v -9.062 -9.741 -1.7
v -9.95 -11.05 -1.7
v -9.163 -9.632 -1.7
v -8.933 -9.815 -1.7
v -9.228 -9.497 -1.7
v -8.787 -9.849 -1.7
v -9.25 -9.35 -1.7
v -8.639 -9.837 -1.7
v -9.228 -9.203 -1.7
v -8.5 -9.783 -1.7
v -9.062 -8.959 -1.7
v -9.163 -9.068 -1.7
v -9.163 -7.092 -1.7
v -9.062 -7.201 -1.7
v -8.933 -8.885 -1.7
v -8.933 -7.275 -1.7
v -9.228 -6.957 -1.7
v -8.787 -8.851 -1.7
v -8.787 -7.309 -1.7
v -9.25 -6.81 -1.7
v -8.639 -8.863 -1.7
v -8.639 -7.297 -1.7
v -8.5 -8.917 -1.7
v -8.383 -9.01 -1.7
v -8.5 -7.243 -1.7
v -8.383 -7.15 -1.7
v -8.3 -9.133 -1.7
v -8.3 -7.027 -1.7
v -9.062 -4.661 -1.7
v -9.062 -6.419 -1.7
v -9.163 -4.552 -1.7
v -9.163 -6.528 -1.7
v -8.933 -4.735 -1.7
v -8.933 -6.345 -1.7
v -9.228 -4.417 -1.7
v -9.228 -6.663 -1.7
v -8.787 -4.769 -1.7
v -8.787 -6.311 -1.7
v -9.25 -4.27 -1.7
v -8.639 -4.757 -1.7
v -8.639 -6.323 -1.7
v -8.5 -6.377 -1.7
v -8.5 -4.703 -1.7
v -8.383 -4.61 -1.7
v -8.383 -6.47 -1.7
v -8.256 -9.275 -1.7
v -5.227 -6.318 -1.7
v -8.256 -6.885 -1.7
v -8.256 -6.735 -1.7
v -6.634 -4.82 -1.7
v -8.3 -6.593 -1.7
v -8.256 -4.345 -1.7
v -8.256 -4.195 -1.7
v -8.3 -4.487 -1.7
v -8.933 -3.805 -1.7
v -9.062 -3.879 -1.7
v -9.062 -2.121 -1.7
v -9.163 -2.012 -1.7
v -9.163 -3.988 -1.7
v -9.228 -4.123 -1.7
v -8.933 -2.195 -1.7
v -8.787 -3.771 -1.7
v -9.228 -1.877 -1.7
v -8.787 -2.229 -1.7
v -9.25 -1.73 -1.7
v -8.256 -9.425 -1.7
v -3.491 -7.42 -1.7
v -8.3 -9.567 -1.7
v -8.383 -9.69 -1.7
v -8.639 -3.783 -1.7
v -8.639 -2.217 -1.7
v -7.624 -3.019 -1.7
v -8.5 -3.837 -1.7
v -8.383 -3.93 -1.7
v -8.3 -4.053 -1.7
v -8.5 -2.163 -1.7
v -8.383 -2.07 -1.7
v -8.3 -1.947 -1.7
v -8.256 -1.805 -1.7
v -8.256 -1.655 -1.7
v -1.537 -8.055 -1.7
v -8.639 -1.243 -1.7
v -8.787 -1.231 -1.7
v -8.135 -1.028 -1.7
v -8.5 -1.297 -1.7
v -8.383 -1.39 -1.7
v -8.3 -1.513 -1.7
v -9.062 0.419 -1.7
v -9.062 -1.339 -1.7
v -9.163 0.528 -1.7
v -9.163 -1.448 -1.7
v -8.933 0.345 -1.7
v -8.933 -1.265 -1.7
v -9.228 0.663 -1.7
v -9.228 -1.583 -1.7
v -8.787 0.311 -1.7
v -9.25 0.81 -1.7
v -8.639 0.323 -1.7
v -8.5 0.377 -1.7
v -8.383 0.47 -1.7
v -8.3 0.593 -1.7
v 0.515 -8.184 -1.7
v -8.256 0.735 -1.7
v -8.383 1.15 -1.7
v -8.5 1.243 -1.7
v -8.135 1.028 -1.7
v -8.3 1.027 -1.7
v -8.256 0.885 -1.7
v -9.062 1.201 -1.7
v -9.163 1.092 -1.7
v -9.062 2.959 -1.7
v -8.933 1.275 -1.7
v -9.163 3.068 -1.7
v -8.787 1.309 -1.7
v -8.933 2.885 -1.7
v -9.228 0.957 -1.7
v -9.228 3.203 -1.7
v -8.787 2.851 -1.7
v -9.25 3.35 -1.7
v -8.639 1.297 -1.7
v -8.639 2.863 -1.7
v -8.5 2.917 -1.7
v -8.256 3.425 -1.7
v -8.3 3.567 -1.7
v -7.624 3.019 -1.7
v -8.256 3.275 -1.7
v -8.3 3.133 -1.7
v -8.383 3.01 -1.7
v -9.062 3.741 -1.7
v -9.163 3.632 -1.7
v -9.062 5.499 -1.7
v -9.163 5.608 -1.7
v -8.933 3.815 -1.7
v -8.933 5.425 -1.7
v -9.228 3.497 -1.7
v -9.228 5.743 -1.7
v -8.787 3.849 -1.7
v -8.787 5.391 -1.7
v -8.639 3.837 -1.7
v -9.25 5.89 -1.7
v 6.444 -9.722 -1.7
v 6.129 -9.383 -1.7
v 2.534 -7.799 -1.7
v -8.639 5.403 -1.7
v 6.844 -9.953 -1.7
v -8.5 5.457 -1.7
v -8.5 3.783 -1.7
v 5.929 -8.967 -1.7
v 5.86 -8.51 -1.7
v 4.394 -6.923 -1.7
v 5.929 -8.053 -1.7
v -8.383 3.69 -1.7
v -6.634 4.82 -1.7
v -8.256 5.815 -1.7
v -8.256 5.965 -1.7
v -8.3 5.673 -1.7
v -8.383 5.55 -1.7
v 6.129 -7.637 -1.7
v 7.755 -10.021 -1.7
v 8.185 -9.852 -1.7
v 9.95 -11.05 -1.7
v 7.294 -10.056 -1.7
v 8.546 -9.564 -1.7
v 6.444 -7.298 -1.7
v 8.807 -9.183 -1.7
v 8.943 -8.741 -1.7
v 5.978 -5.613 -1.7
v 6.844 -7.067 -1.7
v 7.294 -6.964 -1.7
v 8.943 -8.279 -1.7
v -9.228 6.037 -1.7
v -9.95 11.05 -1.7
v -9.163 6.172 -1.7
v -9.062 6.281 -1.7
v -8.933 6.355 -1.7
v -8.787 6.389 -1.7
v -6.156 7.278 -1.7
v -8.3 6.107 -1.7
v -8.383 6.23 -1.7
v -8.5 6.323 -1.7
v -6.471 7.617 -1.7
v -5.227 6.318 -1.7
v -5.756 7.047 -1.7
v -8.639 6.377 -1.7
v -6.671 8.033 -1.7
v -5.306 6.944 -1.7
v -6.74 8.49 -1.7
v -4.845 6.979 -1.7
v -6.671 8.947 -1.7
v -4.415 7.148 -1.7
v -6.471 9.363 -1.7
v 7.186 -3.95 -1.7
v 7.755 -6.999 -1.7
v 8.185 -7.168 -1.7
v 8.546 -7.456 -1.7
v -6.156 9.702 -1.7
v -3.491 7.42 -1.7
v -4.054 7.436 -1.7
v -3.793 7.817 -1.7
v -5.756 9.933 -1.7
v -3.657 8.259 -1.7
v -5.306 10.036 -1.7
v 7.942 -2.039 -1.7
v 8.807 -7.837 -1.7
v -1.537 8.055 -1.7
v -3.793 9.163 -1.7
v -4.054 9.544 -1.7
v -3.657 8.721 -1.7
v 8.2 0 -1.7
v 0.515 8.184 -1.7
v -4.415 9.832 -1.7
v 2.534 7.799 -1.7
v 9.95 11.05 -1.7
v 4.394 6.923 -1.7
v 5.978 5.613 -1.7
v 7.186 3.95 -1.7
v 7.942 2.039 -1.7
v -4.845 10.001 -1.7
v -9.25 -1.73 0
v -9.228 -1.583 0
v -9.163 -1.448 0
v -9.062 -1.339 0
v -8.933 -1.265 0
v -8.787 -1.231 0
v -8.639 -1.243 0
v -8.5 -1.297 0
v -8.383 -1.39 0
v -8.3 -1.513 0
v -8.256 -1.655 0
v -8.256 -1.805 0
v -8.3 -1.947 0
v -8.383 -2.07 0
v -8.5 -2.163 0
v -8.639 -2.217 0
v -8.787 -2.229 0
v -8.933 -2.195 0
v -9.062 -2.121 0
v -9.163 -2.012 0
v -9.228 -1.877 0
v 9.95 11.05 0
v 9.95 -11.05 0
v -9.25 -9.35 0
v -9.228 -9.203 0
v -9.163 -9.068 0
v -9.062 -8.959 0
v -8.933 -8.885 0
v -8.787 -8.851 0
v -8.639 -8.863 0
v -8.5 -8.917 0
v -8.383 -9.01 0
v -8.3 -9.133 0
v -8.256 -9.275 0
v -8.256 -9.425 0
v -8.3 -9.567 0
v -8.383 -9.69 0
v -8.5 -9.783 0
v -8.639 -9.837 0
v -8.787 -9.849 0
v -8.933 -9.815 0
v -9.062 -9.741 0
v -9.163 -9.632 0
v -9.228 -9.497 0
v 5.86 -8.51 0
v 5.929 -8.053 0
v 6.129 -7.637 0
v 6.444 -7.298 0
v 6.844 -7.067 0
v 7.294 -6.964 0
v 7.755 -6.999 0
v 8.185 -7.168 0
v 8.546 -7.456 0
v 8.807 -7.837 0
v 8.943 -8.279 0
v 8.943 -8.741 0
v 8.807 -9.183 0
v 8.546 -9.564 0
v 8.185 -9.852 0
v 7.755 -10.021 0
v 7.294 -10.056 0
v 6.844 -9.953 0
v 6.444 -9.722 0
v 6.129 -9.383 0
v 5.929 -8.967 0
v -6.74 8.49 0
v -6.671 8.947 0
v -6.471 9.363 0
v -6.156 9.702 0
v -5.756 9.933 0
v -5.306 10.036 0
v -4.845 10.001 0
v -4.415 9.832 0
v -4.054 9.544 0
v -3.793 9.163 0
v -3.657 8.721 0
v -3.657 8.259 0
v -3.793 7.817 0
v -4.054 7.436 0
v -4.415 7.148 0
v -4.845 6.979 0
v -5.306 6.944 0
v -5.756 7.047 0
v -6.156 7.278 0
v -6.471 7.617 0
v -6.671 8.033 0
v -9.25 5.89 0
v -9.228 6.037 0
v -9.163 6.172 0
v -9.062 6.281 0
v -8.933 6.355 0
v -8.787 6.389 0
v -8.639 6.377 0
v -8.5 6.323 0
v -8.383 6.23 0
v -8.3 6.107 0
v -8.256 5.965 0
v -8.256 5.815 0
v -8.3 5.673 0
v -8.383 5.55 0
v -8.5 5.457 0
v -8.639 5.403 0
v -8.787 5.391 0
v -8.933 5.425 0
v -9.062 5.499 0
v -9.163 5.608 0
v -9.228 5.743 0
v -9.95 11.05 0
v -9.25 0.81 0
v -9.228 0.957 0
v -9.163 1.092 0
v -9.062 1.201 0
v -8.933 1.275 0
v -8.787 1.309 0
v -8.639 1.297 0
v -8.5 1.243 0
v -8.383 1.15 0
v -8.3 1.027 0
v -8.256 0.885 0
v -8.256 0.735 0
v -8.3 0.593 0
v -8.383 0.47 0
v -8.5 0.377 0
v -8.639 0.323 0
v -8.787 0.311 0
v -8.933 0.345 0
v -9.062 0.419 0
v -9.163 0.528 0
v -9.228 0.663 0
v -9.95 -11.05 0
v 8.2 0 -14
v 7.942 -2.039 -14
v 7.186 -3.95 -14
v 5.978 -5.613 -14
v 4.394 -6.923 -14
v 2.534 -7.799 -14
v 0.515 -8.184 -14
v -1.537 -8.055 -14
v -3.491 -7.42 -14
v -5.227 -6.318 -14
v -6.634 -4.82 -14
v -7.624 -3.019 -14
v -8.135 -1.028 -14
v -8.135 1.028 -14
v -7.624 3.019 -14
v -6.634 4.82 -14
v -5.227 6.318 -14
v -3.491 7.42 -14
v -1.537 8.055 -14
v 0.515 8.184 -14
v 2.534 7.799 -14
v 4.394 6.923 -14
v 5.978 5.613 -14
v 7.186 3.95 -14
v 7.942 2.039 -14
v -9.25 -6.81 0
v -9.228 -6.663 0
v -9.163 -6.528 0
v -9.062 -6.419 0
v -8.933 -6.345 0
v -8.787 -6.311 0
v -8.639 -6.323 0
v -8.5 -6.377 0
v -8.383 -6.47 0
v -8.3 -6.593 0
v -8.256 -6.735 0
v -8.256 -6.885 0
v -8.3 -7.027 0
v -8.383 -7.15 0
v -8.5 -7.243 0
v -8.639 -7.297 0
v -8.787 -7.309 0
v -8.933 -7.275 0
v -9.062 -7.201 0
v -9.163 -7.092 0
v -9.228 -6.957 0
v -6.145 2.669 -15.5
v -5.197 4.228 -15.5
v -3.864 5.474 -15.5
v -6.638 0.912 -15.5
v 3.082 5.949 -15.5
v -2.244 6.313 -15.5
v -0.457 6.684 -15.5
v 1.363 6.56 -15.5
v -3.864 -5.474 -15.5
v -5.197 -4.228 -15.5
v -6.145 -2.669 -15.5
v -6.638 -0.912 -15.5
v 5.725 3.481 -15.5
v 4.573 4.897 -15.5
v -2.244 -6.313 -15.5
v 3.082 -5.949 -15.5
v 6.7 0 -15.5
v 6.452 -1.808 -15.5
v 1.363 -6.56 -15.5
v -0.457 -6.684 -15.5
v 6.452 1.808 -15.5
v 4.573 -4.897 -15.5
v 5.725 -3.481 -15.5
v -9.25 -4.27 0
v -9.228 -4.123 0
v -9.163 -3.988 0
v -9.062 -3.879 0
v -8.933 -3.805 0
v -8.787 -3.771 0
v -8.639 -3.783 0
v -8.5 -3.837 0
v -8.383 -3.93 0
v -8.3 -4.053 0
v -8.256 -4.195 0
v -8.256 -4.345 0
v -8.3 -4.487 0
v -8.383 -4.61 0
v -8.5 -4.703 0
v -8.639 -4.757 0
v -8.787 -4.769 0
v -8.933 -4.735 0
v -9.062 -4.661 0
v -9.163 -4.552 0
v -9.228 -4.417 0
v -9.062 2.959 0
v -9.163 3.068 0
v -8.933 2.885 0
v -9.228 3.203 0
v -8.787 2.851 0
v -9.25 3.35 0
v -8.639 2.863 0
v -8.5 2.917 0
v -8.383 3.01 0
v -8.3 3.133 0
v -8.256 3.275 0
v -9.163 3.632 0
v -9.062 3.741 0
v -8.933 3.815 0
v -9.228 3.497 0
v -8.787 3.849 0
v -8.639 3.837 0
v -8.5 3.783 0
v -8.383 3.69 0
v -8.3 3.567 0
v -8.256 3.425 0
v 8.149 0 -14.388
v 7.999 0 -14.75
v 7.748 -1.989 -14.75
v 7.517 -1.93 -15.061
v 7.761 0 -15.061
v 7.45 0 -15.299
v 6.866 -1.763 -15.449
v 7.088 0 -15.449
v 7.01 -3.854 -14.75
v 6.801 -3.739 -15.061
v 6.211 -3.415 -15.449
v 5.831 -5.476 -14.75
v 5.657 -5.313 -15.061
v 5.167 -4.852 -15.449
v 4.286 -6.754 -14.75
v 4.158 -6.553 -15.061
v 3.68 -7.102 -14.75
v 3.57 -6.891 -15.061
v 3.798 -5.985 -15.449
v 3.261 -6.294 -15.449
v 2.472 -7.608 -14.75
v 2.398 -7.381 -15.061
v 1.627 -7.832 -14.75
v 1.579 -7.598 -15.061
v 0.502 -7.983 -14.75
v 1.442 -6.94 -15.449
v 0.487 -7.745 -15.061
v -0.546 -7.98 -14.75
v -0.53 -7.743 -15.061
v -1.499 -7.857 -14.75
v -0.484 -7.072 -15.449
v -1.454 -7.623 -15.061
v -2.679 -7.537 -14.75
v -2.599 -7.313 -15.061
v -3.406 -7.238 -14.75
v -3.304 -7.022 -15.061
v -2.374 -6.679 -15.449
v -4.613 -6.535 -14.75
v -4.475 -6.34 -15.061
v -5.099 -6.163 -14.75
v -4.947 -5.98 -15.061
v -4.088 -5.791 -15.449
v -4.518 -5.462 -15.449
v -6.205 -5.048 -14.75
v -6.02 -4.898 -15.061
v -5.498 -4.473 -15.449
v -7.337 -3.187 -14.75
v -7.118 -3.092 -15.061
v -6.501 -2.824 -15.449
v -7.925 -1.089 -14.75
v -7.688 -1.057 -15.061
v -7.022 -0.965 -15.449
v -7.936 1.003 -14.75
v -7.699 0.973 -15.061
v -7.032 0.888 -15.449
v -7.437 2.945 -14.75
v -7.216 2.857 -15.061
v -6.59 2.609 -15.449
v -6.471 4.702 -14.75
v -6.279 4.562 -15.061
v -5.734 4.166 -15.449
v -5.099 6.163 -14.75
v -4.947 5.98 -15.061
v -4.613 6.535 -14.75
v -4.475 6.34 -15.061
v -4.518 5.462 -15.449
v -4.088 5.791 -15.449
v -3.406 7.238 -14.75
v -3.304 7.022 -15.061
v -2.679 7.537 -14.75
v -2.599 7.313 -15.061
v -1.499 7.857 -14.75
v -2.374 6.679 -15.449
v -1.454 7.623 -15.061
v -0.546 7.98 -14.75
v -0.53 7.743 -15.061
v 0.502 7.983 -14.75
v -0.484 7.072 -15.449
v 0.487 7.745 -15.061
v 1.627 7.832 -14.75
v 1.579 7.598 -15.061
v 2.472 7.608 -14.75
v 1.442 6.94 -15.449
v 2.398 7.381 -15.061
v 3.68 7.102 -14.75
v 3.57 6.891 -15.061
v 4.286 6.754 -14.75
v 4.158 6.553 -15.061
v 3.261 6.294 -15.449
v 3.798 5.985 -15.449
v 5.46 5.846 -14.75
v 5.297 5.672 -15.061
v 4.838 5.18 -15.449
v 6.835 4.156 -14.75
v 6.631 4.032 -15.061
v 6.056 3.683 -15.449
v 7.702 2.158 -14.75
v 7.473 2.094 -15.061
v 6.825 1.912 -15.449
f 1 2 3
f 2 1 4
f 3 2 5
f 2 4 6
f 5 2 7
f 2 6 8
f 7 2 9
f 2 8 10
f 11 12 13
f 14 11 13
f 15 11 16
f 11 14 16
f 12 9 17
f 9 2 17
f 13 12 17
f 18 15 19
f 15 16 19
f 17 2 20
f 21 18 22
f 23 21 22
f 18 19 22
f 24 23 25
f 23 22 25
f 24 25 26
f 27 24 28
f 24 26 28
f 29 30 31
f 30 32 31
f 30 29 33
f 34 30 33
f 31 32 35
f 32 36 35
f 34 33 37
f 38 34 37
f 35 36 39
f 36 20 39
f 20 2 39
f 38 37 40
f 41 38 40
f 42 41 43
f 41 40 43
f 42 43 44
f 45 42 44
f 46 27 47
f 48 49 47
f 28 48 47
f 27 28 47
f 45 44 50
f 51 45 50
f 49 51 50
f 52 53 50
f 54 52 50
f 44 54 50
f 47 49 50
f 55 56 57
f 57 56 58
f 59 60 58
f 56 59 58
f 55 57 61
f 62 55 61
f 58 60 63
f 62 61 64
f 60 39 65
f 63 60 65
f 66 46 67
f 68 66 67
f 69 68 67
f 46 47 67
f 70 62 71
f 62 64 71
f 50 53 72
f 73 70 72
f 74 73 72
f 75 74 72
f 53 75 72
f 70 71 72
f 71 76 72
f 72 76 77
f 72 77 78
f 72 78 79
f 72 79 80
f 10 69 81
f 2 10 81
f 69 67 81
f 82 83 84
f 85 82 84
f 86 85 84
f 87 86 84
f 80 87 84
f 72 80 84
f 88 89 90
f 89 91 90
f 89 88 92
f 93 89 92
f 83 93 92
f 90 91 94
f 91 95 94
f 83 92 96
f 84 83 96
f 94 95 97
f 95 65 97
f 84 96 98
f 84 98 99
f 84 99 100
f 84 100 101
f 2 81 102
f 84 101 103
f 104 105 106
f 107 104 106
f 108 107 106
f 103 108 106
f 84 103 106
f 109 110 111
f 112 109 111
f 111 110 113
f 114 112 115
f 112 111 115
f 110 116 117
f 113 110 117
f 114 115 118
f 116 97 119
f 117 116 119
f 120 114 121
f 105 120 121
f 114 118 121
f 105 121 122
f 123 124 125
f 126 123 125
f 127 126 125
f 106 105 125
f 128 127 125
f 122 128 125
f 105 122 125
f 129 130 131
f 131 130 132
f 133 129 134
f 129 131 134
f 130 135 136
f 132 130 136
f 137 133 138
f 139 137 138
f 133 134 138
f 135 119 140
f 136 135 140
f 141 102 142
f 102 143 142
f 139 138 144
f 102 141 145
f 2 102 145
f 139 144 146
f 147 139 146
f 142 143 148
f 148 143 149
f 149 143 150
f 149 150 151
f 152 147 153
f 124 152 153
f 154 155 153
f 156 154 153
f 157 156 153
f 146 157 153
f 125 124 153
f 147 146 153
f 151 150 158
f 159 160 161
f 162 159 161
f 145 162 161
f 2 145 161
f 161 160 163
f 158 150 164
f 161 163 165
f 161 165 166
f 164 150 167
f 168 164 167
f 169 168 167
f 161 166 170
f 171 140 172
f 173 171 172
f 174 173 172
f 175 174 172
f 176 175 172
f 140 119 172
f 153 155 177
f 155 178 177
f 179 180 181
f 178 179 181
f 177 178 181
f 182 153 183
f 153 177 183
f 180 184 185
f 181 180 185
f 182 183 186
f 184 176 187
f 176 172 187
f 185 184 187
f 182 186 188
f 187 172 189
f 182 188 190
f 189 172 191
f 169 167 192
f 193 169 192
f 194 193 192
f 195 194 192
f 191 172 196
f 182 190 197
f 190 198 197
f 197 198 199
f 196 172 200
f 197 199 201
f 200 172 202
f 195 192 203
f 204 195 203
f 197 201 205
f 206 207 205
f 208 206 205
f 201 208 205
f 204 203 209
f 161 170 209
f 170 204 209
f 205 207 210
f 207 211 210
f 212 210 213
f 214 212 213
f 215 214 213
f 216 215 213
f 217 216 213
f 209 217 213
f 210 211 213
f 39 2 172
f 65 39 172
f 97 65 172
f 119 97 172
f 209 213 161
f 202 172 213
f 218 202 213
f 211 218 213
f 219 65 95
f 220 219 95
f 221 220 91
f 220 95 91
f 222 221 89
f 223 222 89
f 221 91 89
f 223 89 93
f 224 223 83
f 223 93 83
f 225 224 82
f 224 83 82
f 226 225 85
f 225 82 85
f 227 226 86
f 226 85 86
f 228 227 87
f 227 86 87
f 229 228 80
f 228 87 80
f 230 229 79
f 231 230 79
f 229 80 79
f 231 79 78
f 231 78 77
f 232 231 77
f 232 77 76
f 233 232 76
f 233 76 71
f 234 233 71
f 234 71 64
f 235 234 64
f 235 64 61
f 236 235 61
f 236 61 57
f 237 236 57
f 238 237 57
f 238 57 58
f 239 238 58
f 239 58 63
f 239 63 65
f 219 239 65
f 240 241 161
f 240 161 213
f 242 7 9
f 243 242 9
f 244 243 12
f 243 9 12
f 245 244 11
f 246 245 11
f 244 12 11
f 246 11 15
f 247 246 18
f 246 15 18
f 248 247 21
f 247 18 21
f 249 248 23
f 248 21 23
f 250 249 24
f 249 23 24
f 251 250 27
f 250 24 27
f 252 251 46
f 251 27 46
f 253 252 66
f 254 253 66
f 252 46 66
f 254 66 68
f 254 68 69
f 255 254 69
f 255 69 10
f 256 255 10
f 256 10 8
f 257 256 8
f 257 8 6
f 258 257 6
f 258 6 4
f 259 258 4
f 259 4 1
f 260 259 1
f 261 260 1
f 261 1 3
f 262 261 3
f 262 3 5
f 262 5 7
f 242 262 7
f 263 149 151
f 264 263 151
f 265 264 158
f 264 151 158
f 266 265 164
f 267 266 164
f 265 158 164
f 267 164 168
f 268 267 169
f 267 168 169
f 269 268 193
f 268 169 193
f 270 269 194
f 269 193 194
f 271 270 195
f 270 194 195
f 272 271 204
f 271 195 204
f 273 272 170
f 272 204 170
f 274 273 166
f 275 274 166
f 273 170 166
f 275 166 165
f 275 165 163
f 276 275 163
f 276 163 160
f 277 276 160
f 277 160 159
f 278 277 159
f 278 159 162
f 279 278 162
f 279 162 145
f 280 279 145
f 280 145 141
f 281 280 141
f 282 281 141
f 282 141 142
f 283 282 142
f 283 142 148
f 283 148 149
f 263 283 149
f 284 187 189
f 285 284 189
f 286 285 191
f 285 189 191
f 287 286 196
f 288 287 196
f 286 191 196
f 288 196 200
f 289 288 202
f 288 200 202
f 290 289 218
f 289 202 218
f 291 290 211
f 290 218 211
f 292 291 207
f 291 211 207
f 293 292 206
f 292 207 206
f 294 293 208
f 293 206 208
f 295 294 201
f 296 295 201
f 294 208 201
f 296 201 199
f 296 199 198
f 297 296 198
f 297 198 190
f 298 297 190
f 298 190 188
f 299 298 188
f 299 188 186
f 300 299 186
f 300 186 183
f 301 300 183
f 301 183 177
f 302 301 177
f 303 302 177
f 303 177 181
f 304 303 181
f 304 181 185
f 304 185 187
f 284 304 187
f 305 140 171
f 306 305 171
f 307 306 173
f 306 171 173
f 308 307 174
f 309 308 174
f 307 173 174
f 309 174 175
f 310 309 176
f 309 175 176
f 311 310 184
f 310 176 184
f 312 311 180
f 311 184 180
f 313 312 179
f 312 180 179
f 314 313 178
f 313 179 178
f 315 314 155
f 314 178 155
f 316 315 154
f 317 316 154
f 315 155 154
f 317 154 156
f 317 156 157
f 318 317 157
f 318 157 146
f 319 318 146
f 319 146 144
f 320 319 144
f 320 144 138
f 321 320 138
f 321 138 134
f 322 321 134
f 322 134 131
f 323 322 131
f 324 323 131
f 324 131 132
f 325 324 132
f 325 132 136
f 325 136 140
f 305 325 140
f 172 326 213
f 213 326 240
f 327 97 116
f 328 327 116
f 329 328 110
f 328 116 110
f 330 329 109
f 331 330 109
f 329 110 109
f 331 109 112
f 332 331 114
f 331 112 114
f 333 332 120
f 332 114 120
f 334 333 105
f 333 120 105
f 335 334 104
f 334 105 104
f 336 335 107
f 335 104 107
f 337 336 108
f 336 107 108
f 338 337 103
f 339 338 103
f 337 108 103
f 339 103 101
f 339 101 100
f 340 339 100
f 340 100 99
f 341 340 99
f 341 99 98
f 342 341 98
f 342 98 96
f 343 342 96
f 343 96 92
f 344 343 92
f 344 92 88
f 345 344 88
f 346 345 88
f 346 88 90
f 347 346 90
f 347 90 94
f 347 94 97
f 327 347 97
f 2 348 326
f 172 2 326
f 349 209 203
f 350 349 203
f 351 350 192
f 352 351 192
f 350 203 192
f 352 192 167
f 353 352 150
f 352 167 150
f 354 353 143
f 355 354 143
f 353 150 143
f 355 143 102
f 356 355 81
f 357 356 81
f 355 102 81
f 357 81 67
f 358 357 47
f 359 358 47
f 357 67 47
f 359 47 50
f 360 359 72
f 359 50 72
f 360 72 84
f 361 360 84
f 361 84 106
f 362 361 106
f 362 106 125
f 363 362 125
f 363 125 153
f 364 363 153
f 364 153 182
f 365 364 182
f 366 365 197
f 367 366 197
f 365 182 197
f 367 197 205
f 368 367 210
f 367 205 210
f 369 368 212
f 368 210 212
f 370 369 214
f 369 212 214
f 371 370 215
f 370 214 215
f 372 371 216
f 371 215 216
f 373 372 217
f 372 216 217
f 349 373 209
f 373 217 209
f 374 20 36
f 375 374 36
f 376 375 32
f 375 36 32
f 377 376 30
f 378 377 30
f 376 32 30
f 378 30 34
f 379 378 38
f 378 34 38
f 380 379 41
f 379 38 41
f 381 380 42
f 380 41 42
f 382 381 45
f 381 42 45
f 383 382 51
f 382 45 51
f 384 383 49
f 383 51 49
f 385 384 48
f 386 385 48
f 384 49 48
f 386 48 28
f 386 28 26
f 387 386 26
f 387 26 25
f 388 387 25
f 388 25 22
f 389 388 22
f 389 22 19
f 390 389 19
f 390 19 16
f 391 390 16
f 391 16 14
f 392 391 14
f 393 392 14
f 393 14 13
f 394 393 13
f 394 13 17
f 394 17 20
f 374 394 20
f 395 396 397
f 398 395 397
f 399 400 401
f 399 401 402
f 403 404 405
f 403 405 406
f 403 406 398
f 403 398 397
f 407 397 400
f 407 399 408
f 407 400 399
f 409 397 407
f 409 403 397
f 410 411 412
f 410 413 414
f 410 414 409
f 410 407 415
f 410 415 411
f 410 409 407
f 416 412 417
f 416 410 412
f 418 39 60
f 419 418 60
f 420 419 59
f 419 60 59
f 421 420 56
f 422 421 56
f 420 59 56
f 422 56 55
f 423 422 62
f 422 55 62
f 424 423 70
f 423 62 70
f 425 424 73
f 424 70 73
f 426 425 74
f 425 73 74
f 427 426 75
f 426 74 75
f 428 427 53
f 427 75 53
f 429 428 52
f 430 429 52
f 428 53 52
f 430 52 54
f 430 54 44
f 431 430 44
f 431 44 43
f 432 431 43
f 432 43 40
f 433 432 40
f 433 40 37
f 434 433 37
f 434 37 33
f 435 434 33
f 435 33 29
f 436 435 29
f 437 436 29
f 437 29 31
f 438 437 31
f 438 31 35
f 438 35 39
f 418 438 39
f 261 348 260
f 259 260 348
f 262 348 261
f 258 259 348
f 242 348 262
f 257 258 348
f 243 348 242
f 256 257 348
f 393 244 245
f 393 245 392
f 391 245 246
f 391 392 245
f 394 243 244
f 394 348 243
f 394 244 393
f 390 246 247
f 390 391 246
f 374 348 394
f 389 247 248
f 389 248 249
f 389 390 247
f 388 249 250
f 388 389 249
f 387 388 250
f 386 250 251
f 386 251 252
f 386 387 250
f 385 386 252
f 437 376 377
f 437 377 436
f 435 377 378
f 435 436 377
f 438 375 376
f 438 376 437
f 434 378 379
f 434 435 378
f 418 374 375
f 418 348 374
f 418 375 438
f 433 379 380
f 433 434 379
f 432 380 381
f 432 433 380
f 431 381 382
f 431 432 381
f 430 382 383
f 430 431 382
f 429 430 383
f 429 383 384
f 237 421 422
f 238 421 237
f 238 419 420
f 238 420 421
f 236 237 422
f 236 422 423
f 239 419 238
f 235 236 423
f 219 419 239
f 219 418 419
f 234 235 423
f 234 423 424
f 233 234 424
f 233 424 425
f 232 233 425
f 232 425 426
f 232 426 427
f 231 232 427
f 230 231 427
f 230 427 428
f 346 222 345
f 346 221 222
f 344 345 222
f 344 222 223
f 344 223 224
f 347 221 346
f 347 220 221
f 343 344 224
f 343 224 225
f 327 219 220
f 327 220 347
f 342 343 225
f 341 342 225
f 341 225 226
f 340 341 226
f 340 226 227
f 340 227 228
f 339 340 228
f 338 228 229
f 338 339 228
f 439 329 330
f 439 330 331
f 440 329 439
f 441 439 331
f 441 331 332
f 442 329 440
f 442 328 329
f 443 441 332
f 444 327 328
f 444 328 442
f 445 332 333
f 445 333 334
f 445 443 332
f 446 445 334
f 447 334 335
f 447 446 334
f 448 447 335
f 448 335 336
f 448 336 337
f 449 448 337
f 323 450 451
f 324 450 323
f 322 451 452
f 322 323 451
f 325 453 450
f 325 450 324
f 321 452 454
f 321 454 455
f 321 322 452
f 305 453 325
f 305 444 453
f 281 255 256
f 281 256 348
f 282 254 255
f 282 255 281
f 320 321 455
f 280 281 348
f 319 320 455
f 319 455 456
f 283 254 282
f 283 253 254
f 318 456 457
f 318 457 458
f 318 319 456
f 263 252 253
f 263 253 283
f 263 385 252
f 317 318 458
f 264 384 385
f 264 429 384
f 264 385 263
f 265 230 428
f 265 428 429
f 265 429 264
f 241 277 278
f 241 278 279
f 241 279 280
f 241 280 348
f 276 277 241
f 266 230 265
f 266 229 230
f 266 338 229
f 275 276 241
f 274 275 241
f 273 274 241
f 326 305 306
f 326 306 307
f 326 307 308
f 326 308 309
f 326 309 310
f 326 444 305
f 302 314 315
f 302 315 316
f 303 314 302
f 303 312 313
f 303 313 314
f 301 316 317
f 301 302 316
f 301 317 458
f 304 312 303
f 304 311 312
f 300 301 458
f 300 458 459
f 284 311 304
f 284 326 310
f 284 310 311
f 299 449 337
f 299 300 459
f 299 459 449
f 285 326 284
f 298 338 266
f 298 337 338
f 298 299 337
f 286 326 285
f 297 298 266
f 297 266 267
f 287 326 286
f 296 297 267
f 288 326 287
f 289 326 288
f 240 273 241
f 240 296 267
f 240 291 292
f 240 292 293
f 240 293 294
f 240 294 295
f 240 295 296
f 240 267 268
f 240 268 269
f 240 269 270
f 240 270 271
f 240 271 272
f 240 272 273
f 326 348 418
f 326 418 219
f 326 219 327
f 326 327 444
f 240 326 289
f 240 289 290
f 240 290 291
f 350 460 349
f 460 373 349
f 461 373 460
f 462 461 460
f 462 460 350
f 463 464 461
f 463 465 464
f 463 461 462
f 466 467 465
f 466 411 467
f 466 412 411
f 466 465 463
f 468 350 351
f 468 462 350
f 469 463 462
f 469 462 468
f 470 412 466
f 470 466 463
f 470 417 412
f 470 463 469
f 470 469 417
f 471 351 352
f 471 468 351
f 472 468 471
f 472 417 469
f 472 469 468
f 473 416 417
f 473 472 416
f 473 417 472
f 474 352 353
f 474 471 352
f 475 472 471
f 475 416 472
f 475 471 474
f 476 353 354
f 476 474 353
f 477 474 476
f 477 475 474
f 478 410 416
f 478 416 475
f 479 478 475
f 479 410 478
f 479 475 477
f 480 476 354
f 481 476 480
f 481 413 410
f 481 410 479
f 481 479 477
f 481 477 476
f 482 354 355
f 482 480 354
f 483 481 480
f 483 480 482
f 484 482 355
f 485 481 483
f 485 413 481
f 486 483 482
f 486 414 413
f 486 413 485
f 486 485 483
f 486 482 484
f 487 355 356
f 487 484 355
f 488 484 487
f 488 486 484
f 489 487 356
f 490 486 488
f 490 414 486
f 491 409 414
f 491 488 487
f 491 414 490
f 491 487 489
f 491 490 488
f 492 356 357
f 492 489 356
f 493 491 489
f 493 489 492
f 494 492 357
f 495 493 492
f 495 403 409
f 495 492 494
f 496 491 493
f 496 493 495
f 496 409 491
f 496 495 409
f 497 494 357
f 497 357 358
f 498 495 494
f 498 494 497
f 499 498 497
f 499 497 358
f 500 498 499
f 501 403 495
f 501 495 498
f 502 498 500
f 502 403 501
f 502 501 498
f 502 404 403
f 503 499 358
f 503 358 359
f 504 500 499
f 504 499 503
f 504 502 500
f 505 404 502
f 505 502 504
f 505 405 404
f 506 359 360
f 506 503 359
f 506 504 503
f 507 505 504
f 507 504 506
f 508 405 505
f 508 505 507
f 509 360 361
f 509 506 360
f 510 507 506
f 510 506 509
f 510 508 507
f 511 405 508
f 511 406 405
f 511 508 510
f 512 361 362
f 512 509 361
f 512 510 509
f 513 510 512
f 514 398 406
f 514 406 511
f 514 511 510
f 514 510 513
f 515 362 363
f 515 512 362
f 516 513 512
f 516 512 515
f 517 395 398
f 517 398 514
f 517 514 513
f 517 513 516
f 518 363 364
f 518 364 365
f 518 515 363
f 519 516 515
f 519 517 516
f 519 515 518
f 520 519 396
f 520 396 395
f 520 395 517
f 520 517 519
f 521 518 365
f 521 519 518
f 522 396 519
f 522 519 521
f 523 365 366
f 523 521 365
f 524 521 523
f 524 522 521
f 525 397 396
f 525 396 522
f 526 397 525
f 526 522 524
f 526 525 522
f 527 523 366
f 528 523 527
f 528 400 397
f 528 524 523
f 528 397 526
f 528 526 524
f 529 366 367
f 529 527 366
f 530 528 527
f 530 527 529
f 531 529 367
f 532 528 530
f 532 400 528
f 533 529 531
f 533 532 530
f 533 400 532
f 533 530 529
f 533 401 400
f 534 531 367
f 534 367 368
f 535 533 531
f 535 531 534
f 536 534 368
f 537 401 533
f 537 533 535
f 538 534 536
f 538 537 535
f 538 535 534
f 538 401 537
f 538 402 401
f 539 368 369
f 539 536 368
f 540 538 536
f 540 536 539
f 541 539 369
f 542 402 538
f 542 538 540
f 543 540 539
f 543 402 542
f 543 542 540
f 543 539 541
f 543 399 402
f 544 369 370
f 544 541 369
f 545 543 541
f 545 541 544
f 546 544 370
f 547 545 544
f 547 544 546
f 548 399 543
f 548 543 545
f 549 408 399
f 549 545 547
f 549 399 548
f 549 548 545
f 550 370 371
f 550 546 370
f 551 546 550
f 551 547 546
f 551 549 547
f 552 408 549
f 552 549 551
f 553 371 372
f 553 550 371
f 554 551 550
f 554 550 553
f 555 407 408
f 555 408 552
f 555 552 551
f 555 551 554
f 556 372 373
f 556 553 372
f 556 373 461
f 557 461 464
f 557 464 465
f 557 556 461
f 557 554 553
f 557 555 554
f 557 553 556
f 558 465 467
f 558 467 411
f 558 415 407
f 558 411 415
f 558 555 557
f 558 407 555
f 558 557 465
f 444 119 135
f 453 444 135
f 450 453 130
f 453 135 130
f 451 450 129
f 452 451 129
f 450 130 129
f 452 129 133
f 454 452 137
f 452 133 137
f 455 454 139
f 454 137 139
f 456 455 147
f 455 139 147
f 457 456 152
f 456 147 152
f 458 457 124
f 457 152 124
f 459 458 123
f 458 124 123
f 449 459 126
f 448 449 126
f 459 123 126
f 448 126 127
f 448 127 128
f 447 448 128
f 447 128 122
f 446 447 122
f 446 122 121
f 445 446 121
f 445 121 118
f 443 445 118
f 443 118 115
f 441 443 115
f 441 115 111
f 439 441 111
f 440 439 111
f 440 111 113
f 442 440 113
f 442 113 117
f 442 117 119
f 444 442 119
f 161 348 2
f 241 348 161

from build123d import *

# Parameters (mm, degrees)
F0_W     = 19.9
F0_H     = 22.1
F1_DEPTH = 1.7
F2_D     = 3.1
F2_DEPTH = 5
F3_D     = 1
F3_DEPTH = 5
F4_R     = 8.2
F5_DEPTH = 13.8
F6_R     = 1.5


with BuildPart() as f1:
    # F0 (on Top) → F1 (new body)
    with BuildSketch(Plane.XY):
        Rectangle(F0_W, F0_H)
    extrude(amount=-F1_DEPTH)

    # F2
    with Locations(Plane.XY):
        with Locations((-5.19, 8.49), (7.41, -8.51)):
            Hole(F2_D / 2, depth=F2_DEPTH)

    # F3
    with Locations(Plane.XY):
        with Locations((-8.75, 5.89), (-8.75, 3.35), (-8.75, 0.81), (-8.75, -1.73), (-8.75, -4.27), (-8.75, -6.81), (-8.75, -9.35)):
            Hole(F3_D / 2, depth=F3_DEPTH)

    # F4 (on face) → F5 (join)
    with BuildSketch(Plane(origin=(0, 0, -1.7), x_dir=(1, 0, 0), z_dir=(0, 0, -1))):
        Circle(F4_R)
    extrude(amount=F5_DEPTH)

    # F6
    f6_edges = [f1.edges().sort_by_distance(p)[0] for p in [
        (-8.2, 0, -15.5),
    ]]
    fillet(f6_edges, radius=F6_R)


solid = f1.part
